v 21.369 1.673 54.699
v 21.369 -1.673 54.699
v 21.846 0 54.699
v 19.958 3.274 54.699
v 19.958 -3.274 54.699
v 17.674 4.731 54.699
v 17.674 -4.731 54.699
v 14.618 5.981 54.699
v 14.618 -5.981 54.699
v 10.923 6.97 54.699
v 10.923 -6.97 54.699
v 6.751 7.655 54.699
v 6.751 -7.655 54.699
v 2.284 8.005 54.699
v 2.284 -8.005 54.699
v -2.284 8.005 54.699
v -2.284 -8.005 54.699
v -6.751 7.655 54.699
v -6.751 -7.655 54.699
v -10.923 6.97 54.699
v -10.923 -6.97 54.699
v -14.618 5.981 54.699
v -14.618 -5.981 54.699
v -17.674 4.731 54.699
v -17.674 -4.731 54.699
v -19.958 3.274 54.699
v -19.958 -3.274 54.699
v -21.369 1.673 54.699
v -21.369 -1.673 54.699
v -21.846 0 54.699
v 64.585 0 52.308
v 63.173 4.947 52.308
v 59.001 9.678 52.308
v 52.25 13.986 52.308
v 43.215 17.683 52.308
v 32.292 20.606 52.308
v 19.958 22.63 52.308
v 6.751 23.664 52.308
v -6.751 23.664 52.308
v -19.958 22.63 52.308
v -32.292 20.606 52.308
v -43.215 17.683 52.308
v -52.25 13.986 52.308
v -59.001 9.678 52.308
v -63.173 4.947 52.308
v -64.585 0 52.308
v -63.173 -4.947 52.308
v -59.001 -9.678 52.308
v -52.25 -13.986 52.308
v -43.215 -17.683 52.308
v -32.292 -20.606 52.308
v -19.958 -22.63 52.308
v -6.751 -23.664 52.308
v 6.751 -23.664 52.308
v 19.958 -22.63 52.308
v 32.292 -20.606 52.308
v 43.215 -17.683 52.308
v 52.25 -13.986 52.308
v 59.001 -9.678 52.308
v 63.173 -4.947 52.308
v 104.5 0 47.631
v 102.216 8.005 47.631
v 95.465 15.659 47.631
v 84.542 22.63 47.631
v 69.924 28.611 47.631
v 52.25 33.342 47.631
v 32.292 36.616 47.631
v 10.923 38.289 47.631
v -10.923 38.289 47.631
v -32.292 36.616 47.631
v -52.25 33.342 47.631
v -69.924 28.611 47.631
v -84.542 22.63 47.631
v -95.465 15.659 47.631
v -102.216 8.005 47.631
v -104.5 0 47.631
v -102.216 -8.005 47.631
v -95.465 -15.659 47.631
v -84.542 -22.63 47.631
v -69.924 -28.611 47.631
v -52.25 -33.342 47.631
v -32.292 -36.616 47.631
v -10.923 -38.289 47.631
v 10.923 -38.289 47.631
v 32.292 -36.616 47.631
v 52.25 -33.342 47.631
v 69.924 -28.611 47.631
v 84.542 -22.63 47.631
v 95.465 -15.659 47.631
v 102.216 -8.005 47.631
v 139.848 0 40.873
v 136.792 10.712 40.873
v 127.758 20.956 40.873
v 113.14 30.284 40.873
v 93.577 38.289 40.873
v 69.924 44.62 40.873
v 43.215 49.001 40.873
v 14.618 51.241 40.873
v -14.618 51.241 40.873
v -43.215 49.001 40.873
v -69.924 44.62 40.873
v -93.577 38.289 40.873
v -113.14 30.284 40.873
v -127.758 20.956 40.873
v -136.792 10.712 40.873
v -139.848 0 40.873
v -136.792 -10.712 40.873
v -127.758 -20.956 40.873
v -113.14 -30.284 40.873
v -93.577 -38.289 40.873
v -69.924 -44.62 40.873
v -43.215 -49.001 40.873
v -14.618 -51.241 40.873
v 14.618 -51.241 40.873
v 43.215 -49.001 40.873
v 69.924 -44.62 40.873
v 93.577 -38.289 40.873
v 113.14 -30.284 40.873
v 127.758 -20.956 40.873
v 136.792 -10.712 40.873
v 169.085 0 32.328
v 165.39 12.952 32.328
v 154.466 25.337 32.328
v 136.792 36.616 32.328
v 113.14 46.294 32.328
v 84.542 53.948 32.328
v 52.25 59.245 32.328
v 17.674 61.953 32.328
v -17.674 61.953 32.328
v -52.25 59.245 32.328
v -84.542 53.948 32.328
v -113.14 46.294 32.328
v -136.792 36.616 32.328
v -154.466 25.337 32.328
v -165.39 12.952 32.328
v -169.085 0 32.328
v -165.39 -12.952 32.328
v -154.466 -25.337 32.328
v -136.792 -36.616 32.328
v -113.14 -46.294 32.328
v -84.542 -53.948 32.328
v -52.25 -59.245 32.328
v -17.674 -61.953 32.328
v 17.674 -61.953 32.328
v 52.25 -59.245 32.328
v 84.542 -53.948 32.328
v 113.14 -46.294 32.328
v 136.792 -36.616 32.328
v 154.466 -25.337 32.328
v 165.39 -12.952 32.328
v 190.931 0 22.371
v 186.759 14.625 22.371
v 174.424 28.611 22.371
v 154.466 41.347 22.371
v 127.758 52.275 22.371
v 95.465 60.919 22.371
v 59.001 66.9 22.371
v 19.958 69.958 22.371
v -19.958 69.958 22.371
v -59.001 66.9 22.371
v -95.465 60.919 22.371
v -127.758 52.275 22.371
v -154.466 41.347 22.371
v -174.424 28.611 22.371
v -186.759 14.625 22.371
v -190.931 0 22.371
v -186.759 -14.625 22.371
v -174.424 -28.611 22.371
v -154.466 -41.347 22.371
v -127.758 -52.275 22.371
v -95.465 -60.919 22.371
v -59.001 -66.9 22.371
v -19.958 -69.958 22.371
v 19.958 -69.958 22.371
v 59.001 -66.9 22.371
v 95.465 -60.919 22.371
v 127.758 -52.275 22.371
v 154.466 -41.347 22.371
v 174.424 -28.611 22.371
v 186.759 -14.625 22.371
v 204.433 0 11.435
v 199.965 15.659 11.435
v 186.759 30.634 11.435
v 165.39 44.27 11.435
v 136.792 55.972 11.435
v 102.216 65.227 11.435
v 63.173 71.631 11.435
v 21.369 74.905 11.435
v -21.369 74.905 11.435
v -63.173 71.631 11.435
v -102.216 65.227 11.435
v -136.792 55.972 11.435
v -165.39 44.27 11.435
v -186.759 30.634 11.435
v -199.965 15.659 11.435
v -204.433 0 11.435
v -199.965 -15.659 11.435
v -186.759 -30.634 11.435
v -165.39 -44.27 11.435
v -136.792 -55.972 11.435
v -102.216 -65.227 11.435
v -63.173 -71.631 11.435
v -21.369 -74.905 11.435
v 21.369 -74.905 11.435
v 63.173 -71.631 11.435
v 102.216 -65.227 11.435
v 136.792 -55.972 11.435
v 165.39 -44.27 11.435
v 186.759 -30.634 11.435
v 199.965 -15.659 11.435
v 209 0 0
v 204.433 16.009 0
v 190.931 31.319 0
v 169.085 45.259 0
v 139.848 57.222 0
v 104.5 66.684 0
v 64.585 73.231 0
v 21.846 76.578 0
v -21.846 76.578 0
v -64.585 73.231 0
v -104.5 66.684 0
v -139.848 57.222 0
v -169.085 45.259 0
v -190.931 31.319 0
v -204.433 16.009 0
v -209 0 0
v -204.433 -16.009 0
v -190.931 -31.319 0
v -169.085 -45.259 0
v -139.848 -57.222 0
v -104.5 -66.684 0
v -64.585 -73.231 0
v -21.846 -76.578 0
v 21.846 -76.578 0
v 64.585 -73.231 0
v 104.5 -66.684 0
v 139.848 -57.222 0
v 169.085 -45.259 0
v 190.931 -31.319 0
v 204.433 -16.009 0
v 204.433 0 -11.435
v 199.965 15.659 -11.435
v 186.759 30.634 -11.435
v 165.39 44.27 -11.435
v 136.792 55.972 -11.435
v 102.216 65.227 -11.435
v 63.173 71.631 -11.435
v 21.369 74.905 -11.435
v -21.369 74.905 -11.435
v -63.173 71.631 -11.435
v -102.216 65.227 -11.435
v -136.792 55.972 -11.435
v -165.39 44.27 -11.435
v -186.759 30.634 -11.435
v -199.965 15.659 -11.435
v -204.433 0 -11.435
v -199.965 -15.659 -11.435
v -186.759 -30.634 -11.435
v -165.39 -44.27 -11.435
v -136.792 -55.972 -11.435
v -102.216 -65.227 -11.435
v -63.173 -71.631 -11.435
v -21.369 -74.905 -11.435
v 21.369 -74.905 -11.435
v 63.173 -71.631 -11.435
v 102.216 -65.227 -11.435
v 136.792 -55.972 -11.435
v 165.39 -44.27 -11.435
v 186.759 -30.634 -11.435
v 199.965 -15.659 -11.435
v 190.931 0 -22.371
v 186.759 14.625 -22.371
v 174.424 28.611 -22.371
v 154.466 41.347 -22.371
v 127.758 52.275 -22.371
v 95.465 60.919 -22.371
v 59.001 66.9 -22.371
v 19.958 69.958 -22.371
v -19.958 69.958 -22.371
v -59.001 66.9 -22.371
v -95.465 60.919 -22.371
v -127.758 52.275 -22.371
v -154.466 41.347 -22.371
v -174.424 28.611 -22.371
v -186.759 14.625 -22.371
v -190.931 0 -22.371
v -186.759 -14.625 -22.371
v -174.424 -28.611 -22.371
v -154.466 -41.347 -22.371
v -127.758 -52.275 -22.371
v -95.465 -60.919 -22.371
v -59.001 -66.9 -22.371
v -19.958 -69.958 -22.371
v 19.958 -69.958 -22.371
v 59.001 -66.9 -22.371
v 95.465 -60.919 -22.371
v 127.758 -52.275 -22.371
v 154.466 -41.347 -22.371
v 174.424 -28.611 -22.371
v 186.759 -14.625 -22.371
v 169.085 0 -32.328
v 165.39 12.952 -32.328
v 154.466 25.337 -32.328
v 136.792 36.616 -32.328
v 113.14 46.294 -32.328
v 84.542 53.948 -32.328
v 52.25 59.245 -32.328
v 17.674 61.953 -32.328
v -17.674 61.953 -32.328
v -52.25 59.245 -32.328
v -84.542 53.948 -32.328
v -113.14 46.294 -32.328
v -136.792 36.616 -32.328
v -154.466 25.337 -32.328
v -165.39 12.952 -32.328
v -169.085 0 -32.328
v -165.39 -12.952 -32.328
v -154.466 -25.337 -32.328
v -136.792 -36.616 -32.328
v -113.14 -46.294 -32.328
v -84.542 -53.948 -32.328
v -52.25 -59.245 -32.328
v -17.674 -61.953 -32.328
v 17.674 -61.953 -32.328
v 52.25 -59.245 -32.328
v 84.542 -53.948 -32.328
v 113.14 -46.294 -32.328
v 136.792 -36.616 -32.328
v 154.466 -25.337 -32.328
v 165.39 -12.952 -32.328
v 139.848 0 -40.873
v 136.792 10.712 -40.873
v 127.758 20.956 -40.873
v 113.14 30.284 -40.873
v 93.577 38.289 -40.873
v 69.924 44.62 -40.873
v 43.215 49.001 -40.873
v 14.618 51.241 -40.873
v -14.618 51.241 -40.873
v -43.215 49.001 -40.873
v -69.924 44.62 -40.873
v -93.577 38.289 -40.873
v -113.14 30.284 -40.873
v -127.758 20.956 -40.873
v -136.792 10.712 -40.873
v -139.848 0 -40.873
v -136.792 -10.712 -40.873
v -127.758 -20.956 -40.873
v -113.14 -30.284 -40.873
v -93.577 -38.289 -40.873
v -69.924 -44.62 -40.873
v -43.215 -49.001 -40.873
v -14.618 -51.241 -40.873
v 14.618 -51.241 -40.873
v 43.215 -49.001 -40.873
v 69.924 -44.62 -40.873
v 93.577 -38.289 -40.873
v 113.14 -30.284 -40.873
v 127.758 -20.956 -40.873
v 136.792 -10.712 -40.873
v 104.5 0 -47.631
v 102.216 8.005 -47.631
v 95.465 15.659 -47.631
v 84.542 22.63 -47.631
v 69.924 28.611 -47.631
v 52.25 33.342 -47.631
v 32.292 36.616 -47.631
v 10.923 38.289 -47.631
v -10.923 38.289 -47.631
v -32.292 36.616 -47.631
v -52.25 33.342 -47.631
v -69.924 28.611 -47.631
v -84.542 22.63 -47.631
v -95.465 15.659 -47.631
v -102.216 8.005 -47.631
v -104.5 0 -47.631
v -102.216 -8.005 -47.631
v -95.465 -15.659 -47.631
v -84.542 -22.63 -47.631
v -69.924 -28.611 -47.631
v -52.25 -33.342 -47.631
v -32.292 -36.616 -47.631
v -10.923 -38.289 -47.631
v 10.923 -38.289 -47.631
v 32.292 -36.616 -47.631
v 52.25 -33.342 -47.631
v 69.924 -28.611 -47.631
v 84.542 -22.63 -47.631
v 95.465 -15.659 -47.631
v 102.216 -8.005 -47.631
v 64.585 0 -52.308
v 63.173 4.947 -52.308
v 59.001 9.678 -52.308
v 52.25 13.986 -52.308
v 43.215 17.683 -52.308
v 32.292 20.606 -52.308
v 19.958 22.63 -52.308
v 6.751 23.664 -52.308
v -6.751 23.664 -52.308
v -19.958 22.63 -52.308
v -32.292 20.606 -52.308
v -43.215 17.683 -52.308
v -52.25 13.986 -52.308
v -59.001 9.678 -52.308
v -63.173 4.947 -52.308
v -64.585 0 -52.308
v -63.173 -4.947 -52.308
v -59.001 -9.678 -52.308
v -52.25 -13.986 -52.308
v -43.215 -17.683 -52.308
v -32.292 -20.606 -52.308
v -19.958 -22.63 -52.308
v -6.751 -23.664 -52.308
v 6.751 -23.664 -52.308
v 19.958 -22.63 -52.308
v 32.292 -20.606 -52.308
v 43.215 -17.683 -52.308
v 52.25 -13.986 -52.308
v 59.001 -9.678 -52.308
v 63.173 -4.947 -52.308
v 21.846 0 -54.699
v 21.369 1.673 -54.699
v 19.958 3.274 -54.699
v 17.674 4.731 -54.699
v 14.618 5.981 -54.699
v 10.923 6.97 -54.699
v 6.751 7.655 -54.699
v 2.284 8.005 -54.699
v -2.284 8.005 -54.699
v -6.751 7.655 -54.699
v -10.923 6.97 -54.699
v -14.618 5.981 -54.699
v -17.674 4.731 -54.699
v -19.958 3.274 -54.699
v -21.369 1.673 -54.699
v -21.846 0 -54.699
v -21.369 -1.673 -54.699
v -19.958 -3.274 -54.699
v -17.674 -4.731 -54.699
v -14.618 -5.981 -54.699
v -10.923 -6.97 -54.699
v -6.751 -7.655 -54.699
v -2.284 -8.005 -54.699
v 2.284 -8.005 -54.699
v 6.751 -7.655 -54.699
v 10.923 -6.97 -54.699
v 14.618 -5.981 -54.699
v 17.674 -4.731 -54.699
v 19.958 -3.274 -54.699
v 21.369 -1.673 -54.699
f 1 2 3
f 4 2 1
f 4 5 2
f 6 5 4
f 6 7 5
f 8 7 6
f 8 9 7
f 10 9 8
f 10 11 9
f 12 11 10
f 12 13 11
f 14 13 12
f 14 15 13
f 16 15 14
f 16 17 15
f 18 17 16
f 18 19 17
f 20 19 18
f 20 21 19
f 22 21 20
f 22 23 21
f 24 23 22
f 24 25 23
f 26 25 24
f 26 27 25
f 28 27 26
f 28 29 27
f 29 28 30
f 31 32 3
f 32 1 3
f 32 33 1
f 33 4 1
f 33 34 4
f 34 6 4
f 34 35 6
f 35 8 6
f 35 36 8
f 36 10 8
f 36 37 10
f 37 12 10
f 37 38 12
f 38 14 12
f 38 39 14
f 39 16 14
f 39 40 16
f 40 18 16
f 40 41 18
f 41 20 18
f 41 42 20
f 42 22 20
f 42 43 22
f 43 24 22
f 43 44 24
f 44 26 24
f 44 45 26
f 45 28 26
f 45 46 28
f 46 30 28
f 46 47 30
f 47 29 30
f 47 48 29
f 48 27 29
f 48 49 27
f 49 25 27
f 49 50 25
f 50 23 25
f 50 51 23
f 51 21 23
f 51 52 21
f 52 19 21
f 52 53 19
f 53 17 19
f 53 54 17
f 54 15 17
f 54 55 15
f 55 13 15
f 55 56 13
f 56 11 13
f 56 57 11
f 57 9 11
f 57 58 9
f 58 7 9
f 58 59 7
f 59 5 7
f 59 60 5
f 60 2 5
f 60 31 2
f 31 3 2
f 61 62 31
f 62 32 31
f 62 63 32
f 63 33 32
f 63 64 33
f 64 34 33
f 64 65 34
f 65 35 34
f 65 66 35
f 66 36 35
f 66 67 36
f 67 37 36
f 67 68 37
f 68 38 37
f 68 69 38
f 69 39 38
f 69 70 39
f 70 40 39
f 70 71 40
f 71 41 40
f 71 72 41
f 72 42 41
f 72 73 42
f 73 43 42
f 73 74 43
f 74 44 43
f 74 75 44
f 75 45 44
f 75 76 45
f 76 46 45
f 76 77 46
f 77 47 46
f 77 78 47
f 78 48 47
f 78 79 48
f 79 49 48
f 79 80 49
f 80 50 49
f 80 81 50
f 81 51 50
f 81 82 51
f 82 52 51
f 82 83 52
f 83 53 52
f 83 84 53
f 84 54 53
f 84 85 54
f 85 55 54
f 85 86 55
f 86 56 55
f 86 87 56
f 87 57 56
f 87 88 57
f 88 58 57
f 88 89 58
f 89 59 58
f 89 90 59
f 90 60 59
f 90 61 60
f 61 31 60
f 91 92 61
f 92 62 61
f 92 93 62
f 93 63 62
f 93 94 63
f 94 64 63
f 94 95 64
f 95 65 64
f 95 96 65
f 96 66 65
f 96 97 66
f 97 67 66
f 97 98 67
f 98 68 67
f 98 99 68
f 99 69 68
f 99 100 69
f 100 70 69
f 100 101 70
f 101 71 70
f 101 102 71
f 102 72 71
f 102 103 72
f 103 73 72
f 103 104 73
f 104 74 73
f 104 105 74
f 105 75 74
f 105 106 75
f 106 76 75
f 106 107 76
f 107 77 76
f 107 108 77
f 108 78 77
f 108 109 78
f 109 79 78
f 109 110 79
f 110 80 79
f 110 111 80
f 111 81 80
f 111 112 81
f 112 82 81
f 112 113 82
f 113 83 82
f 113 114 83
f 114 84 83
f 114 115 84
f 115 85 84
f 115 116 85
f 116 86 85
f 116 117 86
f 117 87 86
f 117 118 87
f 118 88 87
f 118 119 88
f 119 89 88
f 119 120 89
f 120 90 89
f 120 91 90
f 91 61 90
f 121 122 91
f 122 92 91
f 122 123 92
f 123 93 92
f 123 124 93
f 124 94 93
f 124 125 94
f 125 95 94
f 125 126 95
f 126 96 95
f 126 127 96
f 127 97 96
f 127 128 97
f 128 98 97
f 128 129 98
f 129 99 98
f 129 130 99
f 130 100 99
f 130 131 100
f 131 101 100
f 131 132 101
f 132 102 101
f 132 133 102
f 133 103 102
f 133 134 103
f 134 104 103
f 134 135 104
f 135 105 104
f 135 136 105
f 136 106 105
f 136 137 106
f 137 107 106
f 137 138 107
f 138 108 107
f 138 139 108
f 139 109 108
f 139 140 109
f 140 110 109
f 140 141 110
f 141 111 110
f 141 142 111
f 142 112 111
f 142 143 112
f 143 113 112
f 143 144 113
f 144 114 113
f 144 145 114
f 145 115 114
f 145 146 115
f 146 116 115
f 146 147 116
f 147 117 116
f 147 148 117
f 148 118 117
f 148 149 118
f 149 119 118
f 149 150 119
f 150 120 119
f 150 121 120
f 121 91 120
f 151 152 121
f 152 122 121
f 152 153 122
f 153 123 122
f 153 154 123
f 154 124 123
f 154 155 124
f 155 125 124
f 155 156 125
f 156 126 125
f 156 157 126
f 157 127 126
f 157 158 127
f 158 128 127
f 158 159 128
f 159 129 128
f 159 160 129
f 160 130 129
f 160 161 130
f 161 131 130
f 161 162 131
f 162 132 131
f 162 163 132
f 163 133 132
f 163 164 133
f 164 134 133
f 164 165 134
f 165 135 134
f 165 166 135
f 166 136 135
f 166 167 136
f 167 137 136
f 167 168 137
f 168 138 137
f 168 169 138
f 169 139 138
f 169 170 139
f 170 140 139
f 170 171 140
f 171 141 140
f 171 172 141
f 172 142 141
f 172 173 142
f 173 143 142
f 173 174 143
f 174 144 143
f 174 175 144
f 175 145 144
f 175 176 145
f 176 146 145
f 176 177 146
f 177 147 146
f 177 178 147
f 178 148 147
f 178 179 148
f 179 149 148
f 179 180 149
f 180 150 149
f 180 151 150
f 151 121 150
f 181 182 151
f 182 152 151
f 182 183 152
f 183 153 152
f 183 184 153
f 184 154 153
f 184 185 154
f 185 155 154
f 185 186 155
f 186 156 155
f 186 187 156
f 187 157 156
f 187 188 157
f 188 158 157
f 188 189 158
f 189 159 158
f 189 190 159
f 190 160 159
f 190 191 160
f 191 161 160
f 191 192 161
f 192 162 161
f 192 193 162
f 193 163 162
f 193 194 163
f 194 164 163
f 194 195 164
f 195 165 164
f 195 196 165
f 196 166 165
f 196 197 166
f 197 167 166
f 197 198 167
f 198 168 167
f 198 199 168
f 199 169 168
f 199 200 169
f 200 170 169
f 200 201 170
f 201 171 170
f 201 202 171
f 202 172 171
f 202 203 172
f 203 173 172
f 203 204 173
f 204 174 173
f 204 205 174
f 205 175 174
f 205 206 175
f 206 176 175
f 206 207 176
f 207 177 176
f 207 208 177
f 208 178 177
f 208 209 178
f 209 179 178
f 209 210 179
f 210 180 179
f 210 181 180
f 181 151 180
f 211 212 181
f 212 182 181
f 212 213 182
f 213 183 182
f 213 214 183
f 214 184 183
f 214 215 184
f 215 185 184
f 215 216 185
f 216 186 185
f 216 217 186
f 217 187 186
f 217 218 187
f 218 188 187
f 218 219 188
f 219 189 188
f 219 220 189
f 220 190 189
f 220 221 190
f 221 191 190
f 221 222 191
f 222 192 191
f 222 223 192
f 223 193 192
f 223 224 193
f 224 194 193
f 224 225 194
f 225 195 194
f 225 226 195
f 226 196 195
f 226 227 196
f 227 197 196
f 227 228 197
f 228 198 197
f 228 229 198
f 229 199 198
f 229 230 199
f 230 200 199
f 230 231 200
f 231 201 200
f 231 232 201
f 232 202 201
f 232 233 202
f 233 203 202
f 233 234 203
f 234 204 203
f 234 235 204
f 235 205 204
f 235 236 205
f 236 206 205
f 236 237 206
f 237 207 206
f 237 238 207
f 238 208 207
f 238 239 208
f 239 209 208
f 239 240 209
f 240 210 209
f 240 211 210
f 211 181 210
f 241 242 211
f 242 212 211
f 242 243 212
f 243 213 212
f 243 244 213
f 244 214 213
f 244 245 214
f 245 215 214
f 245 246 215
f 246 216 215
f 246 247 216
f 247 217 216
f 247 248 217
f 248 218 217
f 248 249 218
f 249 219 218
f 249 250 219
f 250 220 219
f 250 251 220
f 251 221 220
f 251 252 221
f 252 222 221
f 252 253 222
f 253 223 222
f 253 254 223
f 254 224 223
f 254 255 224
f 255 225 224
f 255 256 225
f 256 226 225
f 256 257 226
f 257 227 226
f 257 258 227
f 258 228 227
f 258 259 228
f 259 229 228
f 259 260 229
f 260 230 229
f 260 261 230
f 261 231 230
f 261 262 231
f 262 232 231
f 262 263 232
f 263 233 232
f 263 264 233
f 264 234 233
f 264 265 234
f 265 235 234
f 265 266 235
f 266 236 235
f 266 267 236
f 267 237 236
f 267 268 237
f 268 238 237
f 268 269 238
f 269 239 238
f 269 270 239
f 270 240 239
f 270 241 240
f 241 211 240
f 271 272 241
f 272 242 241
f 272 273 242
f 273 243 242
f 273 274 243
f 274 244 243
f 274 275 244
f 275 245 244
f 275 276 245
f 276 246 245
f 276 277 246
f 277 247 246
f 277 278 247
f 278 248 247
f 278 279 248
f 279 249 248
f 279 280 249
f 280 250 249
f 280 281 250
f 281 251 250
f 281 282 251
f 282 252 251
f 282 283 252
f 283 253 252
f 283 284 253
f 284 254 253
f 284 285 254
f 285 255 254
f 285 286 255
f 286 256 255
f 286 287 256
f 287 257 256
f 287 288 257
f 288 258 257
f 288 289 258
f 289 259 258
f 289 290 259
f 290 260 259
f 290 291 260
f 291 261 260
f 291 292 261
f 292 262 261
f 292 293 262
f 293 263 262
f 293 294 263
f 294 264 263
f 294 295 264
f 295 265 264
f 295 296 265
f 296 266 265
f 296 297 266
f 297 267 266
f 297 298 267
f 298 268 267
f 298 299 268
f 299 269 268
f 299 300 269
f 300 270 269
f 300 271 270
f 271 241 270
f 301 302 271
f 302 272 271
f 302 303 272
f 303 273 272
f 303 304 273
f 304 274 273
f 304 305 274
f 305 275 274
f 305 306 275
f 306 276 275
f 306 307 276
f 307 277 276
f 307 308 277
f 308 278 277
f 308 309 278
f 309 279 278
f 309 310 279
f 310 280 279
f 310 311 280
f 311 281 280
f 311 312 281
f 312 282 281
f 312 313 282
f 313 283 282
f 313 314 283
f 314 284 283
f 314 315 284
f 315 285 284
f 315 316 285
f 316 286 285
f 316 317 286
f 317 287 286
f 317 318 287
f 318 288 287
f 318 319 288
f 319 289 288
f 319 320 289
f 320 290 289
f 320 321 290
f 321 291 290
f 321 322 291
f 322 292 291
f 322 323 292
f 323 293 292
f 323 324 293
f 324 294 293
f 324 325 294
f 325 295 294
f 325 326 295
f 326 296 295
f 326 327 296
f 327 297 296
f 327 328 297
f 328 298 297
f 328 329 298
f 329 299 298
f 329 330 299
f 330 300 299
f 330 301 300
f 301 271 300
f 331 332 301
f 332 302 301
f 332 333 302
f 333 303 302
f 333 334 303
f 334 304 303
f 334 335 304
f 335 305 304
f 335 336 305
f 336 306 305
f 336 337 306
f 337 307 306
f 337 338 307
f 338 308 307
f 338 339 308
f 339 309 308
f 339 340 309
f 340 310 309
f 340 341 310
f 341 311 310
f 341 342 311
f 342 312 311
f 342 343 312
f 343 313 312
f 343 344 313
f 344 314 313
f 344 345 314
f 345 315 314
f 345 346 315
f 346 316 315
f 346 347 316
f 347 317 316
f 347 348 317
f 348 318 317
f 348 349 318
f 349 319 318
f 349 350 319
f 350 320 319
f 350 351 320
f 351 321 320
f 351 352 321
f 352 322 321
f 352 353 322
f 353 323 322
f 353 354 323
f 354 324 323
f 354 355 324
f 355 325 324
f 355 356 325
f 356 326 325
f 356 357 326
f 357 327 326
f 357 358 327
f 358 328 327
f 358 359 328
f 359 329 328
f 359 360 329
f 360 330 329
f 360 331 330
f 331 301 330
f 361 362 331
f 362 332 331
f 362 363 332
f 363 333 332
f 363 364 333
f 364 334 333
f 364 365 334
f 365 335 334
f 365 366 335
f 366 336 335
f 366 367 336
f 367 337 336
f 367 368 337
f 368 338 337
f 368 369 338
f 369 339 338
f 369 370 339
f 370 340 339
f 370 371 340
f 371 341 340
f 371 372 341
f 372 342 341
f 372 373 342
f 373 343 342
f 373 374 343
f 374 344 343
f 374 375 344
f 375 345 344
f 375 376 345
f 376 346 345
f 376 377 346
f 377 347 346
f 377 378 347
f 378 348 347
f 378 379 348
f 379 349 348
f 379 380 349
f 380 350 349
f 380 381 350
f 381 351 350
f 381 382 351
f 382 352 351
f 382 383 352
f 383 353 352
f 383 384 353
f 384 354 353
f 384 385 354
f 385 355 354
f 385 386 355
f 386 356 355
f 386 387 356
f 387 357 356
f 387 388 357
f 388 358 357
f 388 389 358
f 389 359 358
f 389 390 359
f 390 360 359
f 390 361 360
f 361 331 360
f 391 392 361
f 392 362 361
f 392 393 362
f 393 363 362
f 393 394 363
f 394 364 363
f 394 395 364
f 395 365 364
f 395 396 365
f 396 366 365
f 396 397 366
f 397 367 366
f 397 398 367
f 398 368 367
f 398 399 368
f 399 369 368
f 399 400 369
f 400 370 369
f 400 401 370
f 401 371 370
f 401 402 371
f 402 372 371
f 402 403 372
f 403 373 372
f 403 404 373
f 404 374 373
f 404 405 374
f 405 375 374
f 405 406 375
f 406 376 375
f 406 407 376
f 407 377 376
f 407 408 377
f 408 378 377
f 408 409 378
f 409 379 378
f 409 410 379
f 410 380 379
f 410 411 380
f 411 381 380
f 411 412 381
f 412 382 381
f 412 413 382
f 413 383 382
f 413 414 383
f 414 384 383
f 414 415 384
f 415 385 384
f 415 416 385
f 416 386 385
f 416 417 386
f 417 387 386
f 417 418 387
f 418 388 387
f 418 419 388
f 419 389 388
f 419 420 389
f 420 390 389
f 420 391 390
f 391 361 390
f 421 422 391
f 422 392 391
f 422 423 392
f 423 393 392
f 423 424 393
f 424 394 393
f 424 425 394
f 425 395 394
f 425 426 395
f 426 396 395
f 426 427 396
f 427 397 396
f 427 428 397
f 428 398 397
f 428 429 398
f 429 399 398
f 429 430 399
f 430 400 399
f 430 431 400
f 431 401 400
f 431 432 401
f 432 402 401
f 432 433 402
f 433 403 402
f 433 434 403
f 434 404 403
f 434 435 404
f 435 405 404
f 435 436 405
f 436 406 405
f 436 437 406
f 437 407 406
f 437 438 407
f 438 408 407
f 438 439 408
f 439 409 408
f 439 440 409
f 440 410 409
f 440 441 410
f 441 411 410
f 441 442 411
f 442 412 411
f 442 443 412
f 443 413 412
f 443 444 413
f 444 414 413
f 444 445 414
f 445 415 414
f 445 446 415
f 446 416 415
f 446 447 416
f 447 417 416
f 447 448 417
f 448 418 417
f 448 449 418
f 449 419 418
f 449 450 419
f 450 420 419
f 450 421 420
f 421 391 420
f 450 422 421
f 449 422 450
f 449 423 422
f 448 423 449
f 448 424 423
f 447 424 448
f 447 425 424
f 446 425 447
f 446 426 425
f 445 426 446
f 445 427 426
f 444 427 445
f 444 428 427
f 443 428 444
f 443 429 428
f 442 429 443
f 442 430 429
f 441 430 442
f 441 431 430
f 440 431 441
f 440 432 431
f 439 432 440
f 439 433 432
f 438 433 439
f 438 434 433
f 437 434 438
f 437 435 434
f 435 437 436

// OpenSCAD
// Generated by SolidPython 1.0.1 on 2020-07-29 00:46:53


scale(v = [19, 7, 5]) {
	sphere(r = 11);
}
/***********************************************
*********      SolidPython code:      **********
************************************************
 
# import packages: SolidPython
from solid import *
from solid.utils import *
from itertools import chain, combinations, permutations


class Resize:

    def __init__(self, scad_file):
        self.scad_file = scad_file
        #self.scad_file = import_scad(scad_file)
        # cone/cylinder param:
        self.r1 = 0
        self.r2 = 0
        self.h = 0
        # rectangular prism param:
        self.w = 0
        self.l = 0
        # ellipse param:
        self.r = 0

    # import OpenScad code (file name corresponds to shape)


    # classify shape + parameters
    def assign(self, param1, param2, param3):
        if self.scad_file == 'cone.scad':
            self.r1 = param1
            self.r2 = param2
            self.h = param3
        elif self.scad_file == 'cylinder.scad':
            self.r1 = param1
            self.r2 = param2
            self.h = param3
        elif self.scad_file == 'rectangularPrism.scad':
            self.h = param1
            self.l = param2
            self.w = param3
        else:
            self.r = param1
            self.h = param2

    # resize parameters
    def iterate(self):
        x = range(3, 20, 2)
        i = 1
        if self.scad_file == 'cone.scad':
            tempList = list(permutations(x, 2))
            for temp in tempList:
                param1 = temp[0]
                param2 = temp[1]
                filepath = 'produced_scad_files/' + 'cone' + str(param1) + '_' + str(param2) + '_' + '.scad'
                scad_render_to_file(cylinder(h=param1, r1=param2, r2=0), filepath)

        elif self.scad_file == 'cylinder.scad':
            tempList = list(permutations(x, 3))
            for temp in tempList:
                param1 = temp[0]
                param2 = temp[1]
                filepath = 'produced_scad_files/' + 'cylinder' + str(param1) + '_' + str(param2) + '_' + '.scad'
                scad_render_to_file(cylinder(h=param1, r1=param2, r2=param2), filepath)

        elif self.scad_file == 'rectangularPrism.scad':
            tempList = list(permutations(x, 3))
            for temp in tempList:
                param1 = temp[0]
                param2 = temp[1]
                param3 = temp[2]
                filepath = 'produced_scad_files/' + 'rectangularPrism' + str(param1) + '_' + str(param2) + '_' + str(
                    param3) + '.scad'
                scad_render_to_file(cube(size=(param1, param2, param3)), filepath)

        elif self.scad_file == 'ellipse.scad':
            tempList = list(permutations(x, 4))
            for temp in tempList:
                param1 = temp[0]
                param2 = temp[1]
                param3 = temp[2]
                param4 = temp[3]
                filepath = 'produced_scad_files/' + 'ellipse' + str(param1) + '_' + str(param2) + '_' + str(param3) + '_' + str(param4) + '.scad'
                scad_render_to_file(scale([param1, param2, param3])(sphere(r=param4)), filepath)

    def render_to_scadfile(self):
        scad_render_to_file(scad, 'example.scad') 
 
************************************************/
